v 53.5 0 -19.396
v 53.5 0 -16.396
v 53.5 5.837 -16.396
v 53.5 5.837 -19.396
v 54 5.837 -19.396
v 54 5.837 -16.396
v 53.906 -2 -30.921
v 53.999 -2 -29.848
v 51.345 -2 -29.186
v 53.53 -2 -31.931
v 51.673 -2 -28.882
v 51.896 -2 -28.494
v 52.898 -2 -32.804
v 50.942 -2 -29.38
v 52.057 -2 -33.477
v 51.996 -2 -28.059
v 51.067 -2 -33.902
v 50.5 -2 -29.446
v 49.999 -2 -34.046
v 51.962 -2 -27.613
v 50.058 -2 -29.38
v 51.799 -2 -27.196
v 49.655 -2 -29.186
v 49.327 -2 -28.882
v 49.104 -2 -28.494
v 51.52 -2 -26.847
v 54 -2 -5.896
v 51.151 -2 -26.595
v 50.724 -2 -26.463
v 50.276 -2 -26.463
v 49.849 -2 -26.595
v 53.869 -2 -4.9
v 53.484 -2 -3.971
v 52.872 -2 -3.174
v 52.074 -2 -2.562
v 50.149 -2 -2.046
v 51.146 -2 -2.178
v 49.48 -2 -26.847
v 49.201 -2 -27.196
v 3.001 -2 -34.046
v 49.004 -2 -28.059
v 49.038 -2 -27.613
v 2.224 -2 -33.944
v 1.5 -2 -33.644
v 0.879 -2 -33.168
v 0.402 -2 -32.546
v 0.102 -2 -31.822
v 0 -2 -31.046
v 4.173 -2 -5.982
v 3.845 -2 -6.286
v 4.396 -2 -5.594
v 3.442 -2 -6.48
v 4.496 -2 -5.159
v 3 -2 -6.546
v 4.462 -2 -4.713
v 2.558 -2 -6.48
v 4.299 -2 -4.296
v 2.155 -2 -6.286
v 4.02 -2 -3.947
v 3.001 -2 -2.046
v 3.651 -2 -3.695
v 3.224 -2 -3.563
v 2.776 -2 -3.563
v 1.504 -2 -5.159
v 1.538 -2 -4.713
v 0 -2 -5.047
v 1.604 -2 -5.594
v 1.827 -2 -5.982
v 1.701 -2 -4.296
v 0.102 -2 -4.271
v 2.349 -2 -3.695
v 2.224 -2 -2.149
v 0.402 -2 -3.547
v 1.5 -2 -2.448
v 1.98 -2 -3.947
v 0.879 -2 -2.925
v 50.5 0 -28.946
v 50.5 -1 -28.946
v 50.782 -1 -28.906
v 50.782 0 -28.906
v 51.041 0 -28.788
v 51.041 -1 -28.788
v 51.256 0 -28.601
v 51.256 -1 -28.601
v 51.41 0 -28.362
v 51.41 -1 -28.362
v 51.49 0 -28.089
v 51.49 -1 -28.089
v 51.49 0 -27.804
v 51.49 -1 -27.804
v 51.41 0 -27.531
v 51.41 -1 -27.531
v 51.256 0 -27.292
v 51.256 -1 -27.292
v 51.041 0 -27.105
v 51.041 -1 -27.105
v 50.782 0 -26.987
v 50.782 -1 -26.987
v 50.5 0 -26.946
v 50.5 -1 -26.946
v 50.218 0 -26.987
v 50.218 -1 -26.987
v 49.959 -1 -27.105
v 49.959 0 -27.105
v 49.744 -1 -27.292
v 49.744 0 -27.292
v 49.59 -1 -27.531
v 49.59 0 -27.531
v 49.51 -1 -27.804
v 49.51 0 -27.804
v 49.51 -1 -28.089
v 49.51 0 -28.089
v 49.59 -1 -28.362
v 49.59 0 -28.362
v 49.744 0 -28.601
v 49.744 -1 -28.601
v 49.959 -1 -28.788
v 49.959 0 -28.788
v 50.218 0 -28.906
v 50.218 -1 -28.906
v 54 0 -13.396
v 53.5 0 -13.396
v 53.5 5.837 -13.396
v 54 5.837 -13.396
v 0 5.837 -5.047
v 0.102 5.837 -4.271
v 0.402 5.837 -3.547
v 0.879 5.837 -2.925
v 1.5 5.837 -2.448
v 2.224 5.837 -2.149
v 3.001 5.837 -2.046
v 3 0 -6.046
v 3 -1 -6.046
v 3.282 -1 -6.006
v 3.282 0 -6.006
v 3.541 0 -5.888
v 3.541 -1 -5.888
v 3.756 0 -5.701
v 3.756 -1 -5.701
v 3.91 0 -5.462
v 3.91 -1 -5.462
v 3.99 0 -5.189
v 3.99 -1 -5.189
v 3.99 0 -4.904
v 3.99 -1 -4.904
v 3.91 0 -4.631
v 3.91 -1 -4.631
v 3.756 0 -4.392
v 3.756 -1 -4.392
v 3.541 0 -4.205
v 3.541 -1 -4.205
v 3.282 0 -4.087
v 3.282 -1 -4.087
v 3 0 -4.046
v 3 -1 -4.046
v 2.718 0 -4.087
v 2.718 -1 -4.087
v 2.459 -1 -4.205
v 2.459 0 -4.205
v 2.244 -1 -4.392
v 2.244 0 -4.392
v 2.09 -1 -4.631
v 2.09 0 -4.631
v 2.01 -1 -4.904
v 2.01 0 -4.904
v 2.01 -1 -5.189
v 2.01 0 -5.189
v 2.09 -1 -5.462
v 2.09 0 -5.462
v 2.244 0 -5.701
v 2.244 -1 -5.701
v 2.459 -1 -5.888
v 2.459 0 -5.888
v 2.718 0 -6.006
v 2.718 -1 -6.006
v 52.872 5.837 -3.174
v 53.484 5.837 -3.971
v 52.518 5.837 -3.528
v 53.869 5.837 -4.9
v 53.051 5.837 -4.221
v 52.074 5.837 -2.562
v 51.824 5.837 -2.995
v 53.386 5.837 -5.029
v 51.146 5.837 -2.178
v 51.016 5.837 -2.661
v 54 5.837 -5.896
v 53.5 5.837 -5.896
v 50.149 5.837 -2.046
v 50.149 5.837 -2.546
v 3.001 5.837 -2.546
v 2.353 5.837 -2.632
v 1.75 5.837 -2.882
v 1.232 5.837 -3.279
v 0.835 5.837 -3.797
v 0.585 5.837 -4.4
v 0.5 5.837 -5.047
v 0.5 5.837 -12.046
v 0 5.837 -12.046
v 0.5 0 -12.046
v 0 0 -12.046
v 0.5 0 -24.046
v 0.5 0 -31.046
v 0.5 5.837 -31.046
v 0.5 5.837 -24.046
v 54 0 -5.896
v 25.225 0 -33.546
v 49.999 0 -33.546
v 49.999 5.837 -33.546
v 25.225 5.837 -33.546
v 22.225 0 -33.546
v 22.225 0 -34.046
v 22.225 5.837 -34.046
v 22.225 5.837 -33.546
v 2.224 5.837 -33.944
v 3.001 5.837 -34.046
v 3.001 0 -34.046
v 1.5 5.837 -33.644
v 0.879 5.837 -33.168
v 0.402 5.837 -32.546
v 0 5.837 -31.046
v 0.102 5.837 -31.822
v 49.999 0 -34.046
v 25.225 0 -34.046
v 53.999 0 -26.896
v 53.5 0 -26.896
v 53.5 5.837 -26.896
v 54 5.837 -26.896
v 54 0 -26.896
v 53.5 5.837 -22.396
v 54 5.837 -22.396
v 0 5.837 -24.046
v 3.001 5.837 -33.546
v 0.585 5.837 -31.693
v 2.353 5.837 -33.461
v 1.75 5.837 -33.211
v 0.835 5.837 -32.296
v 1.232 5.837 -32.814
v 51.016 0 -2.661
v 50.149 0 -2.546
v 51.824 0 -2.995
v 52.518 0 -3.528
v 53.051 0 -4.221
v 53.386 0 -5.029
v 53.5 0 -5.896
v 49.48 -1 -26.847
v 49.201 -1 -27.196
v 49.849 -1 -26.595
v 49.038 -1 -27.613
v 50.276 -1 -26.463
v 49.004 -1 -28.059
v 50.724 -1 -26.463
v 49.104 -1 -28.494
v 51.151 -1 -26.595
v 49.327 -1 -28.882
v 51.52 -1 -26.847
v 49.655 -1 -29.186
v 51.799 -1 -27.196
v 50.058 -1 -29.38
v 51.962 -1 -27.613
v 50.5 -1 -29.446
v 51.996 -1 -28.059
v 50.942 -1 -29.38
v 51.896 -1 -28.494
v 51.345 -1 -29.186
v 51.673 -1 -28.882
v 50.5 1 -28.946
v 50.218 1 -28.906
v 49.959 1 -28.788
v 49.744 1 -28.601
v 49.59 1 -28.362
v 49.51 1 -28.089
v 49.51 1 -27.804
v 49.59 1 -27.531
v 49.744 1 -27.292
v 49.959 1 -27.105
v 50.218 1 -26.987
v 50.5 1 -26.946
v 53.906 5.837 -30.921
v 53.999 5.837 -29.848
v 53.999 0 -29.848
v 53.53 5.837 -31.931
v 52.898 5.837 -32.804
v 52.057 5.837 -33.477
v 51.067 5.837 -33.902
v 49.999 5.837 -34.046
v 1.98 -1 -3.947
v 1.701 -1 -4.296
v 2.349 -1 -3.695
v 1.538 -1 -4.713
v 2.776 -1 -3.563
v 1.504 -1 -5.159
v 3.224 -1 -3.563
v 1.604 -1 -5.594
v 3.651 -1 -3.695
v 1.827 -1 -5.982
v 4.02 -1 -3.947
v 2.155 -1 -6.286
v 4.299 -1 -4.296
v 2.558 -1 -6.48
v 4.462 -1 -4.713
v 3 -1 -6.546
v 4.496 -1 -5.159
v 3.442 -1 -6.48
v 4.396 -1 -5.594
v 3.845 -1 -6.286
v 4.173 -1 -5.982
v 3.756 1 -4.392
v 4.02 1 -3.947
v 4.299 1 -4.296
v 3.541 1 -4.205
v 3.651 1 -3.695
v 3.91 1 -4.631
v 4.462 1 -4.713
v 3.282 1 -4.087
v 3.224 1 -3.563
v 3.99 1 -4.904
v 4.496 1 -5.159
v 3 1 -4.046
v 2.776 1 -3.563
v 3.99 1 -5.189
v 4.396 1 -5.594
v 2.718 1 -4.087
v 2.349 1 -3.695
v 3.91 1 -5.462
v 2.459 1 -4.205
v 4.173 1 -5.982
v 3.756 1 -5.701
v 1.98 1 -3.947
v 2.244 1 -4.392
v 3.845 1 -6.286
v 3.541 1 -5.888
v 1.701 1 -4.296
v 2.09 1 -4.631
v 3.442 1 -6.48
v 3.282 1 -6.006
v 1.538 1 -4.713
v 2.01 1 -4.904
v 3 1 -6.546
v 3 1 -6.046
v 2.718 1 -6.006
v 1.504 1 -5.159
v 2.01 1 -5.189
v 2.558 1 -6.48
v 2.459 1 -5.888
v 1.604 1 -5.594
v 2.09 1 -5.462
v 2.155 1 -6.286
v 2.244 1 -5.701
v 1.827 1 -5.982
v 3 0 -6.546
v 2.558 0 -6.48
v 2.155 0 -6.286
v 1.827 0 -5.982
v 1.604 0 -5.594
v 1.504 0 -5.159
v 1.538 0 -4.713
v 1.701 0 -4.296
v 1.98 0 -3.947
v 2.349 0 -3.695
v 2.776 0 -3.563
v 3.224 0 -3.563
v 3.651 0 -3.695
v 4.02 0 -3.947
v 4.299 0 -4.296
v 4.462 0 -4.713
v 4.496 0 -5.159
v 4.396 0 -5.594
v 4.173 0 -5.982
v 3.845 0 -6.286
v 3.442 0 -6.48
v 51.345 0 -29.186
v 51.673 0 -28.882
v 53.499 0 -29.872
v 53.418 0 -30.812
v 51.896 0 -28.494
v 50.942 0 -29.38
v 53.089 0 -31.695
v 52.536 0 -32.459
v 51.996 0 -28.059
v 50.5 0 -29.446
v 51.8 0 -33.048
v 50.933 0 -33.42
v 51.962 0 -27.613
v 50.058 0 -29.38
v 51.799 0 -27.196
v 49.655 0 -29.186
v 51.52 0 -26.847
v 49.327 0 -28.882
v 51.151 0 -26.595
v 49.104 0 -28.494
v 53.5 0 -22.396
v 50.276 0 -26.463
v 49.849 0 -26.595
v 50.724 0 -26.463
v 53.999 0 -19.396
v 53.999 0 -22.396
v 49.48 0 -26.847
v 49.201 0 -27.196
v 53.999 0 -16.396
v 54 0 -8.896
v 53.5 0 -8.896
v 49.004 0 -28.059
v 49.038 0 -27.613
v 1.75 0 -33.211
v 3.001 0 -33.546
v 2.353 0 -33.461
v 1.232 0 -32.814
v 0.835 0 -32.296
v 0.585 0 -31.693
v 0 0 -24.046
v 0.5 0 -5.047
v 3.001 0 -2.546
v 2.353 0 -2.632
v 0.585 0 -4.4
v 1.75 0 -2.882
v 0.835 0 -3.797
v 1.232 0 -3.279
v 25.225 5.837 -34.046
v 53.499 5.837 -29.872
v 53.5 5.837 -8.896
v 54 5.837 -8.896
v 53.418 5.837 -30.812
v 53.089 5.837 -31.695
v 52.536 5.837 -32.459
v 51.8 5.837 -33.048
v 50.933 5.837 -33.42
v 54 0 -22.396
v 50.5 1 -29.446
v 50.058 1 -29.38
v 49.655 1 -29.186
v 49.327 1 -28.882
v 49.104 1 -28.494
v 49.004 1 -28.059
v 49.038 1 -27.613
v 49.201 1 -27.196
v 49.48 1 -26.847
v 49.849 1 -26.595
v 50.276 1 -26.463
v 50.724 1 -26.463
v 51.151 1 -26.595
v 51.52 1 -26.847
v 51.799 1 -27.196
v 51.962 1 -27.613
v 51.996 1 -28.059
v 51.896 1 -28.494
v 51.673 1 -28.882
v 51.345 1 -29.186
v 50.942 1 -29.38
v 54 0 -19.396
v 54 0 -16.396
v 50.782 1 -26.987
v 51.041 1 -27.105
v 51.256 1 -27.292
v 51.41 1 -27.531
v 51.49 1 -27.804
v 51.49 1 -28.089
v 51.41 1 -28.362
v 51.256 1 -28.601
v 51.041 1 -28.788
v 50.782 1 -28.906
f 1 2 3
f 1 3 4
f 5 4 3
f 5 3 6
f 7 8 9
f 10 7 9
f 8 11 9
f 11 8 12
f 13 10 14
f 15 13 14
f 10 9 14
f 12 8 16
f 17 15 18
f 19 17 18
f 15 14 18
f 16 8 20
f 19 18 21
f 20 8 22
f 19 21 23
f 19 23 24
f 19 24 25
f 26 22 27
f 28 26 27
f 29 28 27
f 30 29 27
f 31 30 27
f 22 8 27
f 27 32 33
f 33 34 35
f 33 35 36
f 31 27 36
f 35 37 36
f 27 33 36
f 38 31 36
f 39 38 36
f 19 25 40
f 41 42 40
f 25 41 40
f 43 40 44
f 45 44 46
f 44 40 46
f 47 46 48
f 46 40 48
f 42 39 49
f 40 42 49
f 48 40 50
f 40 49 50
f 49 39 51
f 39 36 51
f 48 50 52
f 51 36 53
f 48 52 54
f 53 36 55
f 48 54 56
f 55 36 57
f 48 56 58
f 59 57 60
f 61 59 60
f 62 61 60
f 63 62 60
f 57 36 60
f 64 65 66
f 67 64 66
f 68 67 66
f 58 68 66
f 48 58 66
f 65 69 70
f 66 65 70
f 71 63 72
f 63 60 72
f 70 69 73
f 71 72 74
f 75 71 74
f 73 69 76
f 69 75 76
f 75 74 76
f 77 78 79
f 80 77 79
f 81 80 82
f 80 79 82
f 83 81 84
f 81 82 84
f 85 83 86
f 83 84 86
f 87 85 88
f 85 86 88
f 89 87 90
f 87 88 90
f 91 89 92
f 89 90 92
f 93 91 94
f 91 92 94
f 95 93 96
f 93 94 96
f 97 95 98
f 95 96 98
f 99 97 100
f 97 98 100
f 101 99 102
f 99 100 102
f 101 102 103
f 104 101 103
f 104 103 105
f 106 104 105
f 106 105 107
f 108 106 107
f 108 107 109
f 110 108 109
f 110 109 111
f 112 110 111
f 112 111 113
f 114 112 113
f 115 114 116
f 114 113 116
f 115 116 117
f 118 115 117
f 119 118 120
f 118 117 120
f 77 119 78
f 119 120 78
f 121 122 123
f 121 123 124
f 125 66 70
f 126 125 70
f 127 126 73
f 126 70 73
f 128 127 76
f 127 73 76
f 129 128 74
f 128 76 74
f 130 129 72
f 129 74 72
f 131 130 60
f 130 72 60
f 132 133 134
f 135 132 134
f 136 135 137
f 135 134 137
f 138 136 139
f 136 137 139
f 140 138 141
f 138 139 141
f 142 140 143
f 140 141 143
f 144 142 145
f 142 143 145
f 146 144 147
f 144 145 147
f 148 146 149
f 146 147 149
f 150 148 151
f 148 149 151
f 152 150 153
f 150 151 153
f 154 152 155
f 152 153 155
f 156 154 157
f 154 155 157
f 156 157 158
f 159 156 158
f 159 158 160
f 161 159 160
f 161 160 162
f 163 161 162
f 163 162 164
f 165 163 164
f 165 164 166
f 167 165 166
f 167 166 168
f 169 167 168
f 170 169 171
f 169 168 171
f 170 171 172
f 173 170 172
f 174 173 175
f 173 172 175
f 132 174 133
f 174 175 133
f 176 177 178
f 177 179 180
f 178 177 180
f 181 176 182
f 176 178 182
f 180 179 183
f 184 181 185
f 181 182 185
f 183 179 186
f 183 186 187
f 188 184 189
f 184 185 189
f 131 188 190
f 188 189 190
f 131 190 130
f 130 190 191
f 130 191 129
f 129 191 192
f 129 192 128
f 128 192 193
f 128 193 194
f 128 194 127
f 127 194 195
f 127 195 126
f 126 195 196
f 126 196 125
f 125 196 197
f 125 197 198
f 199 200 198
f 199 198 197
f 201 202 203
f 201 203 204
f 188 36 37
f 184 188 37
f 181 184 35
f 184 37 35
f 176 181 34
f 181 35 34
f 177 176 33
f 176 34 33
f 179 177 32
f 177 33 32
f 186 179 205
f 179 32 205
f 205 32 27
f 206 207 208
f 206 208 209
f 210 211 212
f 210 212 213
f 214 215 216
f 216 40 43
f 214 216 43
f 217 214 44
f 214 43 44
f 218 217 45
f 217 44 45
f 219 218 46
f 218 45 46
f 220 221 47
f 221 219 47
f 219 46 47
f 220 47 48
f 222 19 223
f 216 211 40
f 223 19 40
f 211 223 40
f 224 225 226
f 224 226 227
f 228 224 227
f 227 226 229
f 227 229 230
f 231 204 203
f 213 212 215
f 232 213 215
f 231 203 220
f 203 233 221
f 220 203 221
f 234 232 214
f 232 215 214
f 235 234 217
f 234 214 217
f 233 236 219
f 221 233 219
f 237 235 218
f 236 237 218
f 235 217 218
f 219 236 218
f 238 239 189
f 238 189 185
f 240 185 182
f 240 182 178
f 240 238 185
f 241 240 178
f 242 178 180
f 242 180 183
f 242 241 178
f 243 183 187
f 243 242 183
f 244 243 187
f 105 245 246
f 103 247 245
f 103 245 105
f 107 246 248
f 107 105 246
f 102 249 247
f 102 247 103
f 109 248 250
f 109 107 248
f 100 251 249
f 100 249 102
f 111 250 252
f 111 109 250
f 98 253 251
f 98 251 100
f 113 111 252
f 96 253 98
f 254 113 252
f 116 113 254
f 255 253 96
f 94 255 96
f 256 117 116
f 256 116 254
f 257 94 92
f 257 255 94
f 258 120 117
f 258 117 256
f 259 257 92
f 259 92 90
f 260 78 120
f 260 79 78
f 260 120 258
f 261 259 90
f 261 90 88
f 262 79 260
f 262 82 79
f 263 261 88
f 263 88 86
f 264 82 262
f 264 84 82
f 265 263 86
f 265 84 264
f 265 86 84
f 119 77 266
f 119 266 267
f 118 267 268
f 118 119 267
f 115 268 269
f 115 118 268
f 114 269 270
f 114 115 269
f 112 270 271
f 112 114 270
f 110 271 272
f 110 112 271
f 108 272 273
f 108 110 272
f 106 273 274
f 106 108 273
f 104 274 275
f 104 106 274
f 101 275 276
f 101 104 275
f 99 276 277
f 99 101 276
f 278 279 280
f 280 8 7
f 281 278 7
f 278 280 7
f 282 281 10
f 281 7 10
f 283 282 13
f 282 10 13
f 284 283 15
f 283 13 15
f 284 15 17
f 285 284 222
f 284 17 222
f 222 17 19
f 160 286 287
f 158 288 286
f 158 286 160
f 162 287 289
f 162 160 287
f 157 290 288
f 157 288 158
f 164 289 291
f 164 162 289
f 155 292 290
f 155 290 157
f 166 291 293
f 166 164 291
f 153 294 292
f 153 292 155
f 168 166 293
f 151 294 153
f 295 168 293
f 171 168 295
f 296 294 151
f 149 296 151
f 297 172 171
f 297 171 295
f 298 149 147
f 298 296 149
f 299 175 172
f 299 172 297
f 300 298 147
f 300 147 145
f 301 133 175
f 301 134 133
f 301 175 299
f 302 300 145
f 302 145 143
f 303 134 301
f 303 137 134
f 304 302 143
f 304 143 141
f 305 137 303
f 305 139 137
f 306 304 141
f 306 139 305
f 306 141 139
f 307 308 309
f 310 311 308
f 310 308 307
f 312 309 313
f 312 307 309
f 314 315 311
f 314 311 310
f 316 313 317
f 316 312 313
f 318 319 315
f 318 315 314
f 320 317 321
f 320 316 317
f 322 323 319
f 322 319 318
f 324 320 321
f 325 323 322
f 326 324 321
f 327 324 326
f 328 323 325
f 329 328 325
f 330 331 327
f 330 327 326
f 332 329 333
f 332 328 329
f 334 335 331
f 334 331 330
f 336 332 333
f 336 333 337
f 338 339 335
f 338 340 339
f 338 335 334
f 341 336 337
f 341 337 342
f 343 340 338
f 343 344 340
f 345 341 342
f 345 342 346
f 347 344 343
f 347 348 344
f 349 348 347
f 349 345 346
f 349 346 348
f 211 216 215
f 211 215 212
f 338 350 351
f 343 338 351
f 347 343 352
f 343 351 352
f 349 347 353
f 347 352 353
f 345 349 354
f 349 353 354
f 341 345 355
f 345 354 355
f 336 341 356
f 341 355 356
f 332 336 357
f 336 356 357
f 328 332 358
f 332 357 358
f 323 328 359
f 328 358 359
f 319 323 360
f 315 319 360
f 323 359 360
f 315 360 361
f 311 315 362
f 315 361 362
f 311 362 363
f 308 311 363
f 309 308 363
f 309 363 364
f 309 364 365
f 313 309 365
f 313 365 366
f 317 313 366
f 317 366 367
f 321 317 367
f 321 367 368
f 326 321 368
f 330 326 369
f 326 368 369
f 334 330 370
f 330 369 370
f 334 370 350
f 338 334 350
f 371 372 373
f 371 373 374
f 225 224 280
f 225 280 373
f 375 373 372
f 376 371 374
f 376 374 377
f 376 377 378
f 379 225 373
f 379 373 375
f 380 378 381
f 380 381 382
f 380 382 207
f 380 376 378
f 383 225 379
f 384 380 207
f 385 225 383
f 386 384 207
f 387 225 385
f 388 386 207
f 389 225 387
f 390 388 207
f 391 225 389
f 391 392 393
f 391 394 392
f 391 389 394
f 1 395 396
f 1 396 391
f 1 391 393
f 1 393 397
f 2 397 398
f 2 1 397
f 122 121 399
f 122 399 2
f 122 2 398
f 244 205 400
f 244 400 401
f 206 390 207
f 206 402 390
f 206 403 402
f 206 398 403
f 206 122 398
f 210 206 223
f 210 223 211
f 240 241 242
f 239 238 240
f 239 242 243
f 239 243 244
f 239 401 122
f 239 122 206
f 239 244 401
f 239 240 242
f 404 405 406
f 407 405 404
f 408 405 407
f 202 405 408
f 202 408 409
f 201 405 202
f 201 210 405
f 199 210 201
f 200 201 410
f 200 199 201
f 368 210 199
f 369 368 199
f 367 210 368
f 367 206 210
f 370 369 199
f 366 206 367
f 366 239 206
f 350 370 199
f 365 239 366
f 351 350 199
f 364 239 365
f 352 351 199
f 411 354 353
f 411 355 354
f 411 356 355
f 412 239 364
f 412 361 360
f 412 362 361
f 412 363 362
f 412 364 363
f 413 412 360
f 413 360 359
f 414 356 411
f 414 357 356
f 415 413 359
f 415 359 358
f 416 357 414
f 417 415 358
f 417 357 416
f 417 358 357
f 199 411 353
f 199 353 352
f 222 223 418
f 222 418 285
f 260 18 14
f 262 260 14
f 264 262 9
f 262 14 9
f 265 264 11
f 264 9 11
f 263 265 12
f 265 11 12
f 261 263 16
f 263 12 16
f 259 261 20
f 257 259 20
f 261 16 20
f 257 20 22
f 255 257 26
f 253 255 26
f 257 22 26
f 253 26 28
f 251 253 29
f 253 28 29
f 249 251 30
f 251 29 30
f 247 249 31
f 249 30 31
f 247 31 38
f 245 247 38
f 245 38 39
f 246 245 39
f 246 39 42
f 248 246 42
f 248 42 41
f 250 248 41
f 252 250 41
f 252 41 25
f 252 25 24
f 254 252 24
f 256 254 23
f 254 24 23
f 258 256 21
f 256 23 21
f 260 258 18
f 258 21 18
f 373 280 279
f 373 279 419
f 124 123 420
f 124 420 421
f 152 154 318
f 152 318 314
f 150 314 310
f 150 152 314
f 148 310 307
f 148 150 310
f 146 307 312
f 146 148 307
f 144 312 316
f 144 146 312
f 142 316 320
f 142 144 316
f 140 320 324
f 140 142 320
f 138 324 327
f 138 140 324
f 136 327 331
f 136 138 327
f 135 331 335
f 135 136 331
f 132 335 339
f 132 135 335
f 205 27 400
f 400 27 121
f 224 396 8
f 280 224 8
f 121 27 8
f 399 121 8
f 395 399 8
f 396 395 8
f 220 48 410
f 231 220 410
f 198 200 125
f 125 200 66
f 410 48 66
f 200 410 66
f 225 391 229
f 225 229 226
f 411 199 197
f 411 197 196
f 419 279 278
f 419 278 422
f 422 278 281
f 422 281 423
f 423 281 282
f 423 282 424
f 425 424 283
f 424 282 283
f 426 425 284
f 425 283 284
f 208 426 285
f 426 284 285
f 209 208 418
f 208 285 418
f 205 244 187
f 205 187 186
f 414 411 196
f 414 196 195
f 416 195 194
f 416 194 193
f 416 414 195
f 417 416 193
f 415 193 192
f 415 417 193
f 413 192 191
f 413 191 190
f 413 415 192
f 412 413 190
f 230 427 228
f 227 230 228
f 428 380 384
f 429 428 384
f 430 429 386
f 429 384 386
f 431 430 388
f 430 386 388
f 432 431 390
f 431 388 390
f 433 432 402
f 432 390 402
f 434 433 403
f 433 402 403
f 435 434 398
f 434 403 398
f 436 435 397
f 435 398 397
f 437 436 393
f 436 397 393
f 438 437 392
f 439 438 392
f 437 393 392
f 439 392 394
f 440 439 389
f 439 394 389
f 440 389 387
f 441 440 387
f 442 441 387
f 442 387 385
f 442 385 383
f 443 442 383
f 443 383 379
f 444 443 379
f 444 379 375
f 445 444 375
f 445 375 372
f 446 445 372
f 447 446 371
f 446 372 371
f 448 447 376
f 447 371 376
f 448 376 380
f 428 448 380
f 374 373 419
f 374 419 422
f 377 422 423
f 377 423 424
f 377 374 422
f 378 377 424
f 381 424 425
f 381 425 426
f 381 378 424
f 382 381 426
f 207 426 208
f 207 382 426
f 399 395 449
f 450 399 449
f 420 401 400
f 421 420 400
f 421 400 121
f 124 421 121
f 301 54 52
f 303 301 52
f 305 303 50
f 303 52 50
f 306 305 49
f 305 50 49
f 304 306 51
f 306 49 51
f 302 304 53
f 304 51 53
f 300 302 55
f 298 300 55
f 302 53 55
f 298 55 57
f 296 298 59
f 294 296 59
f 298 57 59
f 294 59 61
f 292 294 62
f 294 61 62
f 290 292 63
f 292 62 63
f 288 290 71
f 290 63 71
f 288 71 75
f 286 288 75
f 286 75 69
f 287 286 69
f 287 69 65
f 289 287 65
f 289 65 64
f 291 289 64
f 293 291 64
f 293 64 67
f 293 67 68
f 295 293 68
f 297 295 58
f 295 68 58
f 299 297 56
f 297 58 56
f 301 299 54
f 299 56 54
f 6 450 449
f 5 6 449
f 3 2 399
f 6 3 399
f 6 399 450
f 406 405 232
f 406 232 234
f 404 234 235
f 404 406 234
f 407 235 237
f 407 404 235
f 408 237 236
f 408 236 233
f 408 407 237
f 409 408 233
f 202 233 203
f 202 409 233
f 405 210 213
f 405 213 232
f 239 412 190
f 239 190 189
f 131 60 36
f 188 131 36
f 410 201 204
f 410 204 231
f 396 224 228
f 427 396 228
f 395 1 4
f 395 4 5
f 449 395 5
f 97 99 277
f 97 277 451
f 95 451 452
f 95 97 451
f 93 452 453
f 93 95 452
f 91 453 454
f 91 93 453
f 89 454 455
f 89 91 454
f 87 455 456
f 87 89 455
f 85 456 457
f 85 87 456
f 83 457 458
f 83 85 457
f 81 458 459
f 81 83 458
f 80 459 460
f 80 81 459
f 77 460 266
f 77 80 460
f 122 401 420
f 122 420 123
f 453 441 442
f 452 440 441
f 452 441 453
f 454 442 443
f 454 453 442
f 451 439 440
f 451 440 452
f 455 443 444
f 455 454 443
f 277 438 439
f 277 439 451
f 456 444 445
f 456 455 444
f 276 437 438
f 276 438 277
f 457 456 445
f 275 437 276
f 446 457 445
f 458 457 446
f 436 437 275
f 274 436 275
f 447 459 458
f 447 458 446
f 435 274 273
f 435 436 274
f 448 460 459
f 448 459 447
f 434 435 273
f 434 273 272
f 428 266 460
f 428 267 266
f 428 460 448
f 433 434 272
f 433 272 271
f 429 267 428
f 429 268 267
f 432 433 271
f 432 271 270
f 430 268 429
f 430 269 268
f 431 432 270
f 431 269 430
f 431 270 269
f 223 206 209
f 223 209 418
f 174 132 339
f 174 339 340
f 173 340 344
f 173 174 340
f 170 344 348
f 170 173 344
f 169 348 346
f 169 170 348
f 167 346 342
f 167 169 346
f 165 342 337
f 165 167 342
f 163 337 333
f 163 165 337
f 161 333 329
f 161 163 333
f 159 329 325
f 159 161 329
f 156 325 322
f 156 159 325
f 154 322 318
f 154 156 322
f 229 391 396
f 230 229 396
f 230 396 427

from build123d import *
from build123d.topology import SkipClean

# Parameters (mm, degrees)
Y_KSEKLIK_EKSTR_ZYON6_DEPTH   = 5.836879
Y_KSEKLIK_EKSTR_ZYON6_2_DEPTH = 5.836879
Y_KSEKLIK_EKSTR_ZYON6_3_DEPTH = 5.836879
IZIM5_W                       = 0.5
IZIM5_H                       = 4.5
Y_KSEKLIK_EKSTR_ZYON6_4_DEPTH = 5.836879
IZIM5_H_2                     = 3
Y_KSEKLIK_EKSTR_ZYON6_5_DEPTH = 5.836879
IZIM5_H_3                     = 4.500000477
Y_KSEKLIK_EKSTR_ZYON6_6_DEPTH = 5.836879
Y_KSEKLIK_EKSTR_ZYON7_START   = 2
Y_KSEKLIK_EKSTR_ZYON7_DEPTH   = 2
IZIM9_R                       = 1.5
IZIM9_R_2                     = 1.00000054
Y_KSEKLIK_EKSTR_ZYON10_DEPTH  = 1
IZIM15_R                      = 1.5
IZIM15_R_2                    = 1.00000054
KES_EKSTR_ZYON1_DEPTH         = 1
IZIM16_R                      = 1.00000054
KES_EKSTR_ZYON2_DEPTH         = 9


with BuildPart() as part:
    # Çizim5 → Yükseklik-Ekstrüzyon6 (new body)
    with BuildSketch(Plane(origin=(0, 0, 0), x_dir=(1, 0, 0), z_dir=(0, 1, 0))):
        with BuildLine():
            Line((49.998890085, 33.546469342), (25.224998474, 33.546469342))
            Line((25.224998474, 33.546469342), (25.224998474, 34.046469342))
            Line((25.224998474, 34.046469342), (49.998890085, 34.046469342))
            ThreePointArc((49.998890085, 34.046469342), (52.898283285, 32.804189289), (53.998828886, 29.848087119))
            Line((53.998828886, 29.848087119), (53.499414443, 29.872278319))
            ThreePointArc((53.499414443, 29.872278319), (52.536278036, 32.459294812), (49.998890085, 33.546469342))
        make_face()
    extrude(amount=Y_KSEKLIK_EKSTR_ZYON6_DEPTH)



with BuildPart() as body_2:
    # Çizim5 → Y_kseklik-Ekstr_zyon6 2 (new body)
    with BuildSketch(Plane(origin=(0, 0, 0), x_dir=(1, 0, 0), z_dir=(0, 1, 0))):
        with BuildLine():
            Line((50.149132956, 2.046469359), (3.000730401, 2.046469359))
            ThreePointArc((3.000730401, 2.046469359), (0.878893586, 2.925362945), (0, 5.04719976))
            Line((0, 5.04719976), (0, 12.046469359))
            Line((0, 12.046469359), (0.5, 12.046469359))
            Line((0.5, 12.046469359), (0.5, 5.04719976))
            ThreePointArc((0.5, 5.04719976), (1.232446977, 3.278916336), (3.000730401, 2.546469359))
            Line((3.000730401, 2.546469359), (50.149132956, 2.546469359))
            ThreePointArc((50.149132956, 2.546469359), (52.518193482, 3.52755531), (53.499999977, 5.896317313))
            Line((53.499999977, 5.896317313), (53.999999954, 5.896165229))
            ThreePointArc((53.999999954, 5.896165229), (52.871693099, 3.173948154), (50.149132956, 2.046469359))
        make_face()
    extrude(amount=Y_KSEKLIK_EKSTR_ZYON6_2_DEPTH)


with BuildPart() as body_3:
    # Çizim5 → Y_kseklik-Ekstr_zyon6 3 (new body)
    with BuildSketch(Plane(origin=(0, 0, 0), x_dir=(1, 0, 0), z_dir=(0, 1, 0))):
        with BuildLine():
            Line((0, 24.04646891), (0, 31.045738379))
            ThreePointArc((0, 31.045738379), (0.878893795, 33.167575698), (3.000731114, 34.046469493))
            Line((3.000731114, 34.046469493), (22.224998474, 34.046469493))
            Line((22.224998474, 34.046469493), (22.224998474, 33.546469493))
            Line((22.224998474, 33.546469493), (3.000731114, 33.546469493))
            ThreePointArc((3.000731114, 33.546469493), (1.232447185, 32.814022307), (0.5, 31.045738379))
            Line((0.5, 31.045738379), (0.5, 24.04646891))
            Line((0.5, 24.04646891), (0, 24.04646891))
        make_face()
    extrude(amount=Y_KSEKLIK_EKSTR_ZYON6_3_DEPTH)


with BuildPart() as body_4:
    # Çizim5 → Y_kseklik-Ekstr_zyon6 4 (new body)
    with BuildSketch(Plane(origin=(0, 0, 0), x_dir=(1, 0, 0), z_dir=(0, 1, 0))):
        with Locations((53.75, 24.646469741)):
            Rectangle(IZIM5_W, IZIM5_H)
    extrude(amount=Y_KSEKLIK_EKSTR_ZYON6_4_DEPTH)


with BuildPart() as body_5:
    # Çizim5 → Y_kseklik-Ekstr_zyon6 5 (new body)
    with BuildSketch(Plane(origin=(0, 0, 0), x_dir=(1, 0, 0), z_dir=(0, 1, 0))):
        with Locations((53.75, 17.896469741)):
            Rectangle(IZIM5_W, IZIM5_H_2)
    extrude(amount=Y_KSEKLIK_EKSTR_ZYON6_5_DEPTH)


with BuildPart() as body_6:
    # Çizim5 → Y_kseklik-Ekstr_zyon6 6 (new body)
    with BuildSketch(Plane(origin=(0, 0, 0), x_dir=(1, 0, 0), z_dir=(0, 1, 0))):
        with Locations((53.75, 11.146469503)):
            Rectangle(IZIM5_W, IZIM5_H_3)
    extrude(amount=Y_KSEKLIK_EKSTR_ZYON6_6_DEPTH)


with BuildPart() as part_1:
    add(part.part)

    add(body_2.part)  # Yükseklik-Ekstrüzyon7 merges body 2

    add(body_3.part)  # Yükseklik-Ekstrüzyon7 merges body 3

    add(body_4.part)  # Yükseklik-Ekstrüzyon7 merges body 4

    add(body_5.part)  # Yükseklik-Ekstrüzyon7 merges body 5

    add(body_6.part)  # Yükseklik-Ekstrüzyon7 merges body 6
    # Çizim6 → Yükseklik-Ekstrüzyon7 (add)
    with BuildSketch(Plane.XZ.offset(Y_KSEKLIK_EKSTR_ZYON7_START)):
        with BuildLine():
            Line((0, -31.045738379), (0, -5.04719976))
            ThreePointArc((0, -5.04719976), (0.878893586, -2.925362945), (3.000730401, -2.046469359))
            Line((3.000730401, -2.046469359), (50.149132956, -2.046469359))
            ThreePointArc((50.149132956, -2.046469359), (52.871693099, -3.173948154), (53.999999954, -5.896165229))
            Line((53.999999954, -5.896165229), (53.998828886, -29.848087119))
            ThreePointArc((53.998828886, -29.848087119), (52.898283285, -32.804189289), (49.998890085, -34.046469342))
            Line((49.998890085, -34.046469342), (3.000731114, -34.046469493))
            ThreePointArc((3.000731114, -34.046469493), (0.878893795, -33.167575698), (0, -31.045738379))
        make_face()
    extrude(amount=-Y_KSEKLIK_EKSTR_ZYON7_DEPTH)

    # Çizim9 → Yükseklik-Ekstrüzyon10 (add)
    # profile 1 of 2: a face of its own
    with BuildSketch(Plane(origin=(0, 0, 0), x_dir=(1, 0, 0), z_dir=(0, 1, 0))):
        with Locations(Location((3.00000102, 5.046470439, 0), (0, 0, 90))):
            Circle(IZIM9_R)
        with Locations(Location((3.00000102, 5.046470439, 0), (0, 0, 270))):
            Circle(IZIM9_R_2, mode=Mode.SUBTRACT)
    # profile 2 of 2: a face of its own
    with BuildSketch(Plane(origin=(0, 0, 0), x_dir=(1, 0, 0), z_dir=(0, 1, 0))):
        with Locations(Location((50.5, 27.946470359, 0), (0, 0, 90))):
            Circle(IZIM9_R)
        with Locations(Location((50.5, 27.946470359, 0), (0, 0, 270))):
            Circle(IZIM9_R_2, mode=Mode.SUBTRACT)
    extrude(amount=Y_KSEKLIK_EKSTR_ZYON10_DEPTH)

    # Çizim15 → Kes-Ekstrüzyon1 (cut)
    # profile 1 of 2: a face of its own
    with BuildSketch(Plane.XZ.offset(2)):
        with Locations(Location((3.00000102, -5.046470439, 0), (0, 0, 270))):
            Circle(IZIM15_R)
        with Locations(Location((3.00000102, -5.046470439, 0), (0, 0, 90))):
            Circle(IZIM15_R_2, mode=Mode.SUBTRACT)
    # profile 2 of 2: a face of its own
    with BuildSketch(Plane.XZ.offset(2)):
        with Locations(Location((50.5, -27.946470359, 0), (0, 0, 270))):
            Circle(IZIM15_R)
        with Locations(Location((50.5, -27.946470359, 0), (0, 0, 90))):
            Circle(IZIM15_R_2, mode=Mode.SUBTRACT)
    extrude(amount=-KES_EKSTR_ZYON1_DEPTH, mode=Mode.SUBTRACT)

    # Çizim16 → Kes-Ekstrüzyon2 (cut)
    with SkipClean():  # the faces are left unmerged after this step: merging them gives an invalid solid
        with BuildSketch(Plane.XZ.offset(2)):
            with Locations(Location((3.00000102, -5.046470439, 0), (0, 0, 270))):
                Circle(IZIM16_R)
            with Locations(Location((50.5, -27.946470359, 0), (0, 0, 270))):
                Circle(IZIM16_R)
        extrude(amount=-KES_EKSTR_ZYON2_DEPTH, mode=Mode.SUBTRACT)


solid = part_1.part
